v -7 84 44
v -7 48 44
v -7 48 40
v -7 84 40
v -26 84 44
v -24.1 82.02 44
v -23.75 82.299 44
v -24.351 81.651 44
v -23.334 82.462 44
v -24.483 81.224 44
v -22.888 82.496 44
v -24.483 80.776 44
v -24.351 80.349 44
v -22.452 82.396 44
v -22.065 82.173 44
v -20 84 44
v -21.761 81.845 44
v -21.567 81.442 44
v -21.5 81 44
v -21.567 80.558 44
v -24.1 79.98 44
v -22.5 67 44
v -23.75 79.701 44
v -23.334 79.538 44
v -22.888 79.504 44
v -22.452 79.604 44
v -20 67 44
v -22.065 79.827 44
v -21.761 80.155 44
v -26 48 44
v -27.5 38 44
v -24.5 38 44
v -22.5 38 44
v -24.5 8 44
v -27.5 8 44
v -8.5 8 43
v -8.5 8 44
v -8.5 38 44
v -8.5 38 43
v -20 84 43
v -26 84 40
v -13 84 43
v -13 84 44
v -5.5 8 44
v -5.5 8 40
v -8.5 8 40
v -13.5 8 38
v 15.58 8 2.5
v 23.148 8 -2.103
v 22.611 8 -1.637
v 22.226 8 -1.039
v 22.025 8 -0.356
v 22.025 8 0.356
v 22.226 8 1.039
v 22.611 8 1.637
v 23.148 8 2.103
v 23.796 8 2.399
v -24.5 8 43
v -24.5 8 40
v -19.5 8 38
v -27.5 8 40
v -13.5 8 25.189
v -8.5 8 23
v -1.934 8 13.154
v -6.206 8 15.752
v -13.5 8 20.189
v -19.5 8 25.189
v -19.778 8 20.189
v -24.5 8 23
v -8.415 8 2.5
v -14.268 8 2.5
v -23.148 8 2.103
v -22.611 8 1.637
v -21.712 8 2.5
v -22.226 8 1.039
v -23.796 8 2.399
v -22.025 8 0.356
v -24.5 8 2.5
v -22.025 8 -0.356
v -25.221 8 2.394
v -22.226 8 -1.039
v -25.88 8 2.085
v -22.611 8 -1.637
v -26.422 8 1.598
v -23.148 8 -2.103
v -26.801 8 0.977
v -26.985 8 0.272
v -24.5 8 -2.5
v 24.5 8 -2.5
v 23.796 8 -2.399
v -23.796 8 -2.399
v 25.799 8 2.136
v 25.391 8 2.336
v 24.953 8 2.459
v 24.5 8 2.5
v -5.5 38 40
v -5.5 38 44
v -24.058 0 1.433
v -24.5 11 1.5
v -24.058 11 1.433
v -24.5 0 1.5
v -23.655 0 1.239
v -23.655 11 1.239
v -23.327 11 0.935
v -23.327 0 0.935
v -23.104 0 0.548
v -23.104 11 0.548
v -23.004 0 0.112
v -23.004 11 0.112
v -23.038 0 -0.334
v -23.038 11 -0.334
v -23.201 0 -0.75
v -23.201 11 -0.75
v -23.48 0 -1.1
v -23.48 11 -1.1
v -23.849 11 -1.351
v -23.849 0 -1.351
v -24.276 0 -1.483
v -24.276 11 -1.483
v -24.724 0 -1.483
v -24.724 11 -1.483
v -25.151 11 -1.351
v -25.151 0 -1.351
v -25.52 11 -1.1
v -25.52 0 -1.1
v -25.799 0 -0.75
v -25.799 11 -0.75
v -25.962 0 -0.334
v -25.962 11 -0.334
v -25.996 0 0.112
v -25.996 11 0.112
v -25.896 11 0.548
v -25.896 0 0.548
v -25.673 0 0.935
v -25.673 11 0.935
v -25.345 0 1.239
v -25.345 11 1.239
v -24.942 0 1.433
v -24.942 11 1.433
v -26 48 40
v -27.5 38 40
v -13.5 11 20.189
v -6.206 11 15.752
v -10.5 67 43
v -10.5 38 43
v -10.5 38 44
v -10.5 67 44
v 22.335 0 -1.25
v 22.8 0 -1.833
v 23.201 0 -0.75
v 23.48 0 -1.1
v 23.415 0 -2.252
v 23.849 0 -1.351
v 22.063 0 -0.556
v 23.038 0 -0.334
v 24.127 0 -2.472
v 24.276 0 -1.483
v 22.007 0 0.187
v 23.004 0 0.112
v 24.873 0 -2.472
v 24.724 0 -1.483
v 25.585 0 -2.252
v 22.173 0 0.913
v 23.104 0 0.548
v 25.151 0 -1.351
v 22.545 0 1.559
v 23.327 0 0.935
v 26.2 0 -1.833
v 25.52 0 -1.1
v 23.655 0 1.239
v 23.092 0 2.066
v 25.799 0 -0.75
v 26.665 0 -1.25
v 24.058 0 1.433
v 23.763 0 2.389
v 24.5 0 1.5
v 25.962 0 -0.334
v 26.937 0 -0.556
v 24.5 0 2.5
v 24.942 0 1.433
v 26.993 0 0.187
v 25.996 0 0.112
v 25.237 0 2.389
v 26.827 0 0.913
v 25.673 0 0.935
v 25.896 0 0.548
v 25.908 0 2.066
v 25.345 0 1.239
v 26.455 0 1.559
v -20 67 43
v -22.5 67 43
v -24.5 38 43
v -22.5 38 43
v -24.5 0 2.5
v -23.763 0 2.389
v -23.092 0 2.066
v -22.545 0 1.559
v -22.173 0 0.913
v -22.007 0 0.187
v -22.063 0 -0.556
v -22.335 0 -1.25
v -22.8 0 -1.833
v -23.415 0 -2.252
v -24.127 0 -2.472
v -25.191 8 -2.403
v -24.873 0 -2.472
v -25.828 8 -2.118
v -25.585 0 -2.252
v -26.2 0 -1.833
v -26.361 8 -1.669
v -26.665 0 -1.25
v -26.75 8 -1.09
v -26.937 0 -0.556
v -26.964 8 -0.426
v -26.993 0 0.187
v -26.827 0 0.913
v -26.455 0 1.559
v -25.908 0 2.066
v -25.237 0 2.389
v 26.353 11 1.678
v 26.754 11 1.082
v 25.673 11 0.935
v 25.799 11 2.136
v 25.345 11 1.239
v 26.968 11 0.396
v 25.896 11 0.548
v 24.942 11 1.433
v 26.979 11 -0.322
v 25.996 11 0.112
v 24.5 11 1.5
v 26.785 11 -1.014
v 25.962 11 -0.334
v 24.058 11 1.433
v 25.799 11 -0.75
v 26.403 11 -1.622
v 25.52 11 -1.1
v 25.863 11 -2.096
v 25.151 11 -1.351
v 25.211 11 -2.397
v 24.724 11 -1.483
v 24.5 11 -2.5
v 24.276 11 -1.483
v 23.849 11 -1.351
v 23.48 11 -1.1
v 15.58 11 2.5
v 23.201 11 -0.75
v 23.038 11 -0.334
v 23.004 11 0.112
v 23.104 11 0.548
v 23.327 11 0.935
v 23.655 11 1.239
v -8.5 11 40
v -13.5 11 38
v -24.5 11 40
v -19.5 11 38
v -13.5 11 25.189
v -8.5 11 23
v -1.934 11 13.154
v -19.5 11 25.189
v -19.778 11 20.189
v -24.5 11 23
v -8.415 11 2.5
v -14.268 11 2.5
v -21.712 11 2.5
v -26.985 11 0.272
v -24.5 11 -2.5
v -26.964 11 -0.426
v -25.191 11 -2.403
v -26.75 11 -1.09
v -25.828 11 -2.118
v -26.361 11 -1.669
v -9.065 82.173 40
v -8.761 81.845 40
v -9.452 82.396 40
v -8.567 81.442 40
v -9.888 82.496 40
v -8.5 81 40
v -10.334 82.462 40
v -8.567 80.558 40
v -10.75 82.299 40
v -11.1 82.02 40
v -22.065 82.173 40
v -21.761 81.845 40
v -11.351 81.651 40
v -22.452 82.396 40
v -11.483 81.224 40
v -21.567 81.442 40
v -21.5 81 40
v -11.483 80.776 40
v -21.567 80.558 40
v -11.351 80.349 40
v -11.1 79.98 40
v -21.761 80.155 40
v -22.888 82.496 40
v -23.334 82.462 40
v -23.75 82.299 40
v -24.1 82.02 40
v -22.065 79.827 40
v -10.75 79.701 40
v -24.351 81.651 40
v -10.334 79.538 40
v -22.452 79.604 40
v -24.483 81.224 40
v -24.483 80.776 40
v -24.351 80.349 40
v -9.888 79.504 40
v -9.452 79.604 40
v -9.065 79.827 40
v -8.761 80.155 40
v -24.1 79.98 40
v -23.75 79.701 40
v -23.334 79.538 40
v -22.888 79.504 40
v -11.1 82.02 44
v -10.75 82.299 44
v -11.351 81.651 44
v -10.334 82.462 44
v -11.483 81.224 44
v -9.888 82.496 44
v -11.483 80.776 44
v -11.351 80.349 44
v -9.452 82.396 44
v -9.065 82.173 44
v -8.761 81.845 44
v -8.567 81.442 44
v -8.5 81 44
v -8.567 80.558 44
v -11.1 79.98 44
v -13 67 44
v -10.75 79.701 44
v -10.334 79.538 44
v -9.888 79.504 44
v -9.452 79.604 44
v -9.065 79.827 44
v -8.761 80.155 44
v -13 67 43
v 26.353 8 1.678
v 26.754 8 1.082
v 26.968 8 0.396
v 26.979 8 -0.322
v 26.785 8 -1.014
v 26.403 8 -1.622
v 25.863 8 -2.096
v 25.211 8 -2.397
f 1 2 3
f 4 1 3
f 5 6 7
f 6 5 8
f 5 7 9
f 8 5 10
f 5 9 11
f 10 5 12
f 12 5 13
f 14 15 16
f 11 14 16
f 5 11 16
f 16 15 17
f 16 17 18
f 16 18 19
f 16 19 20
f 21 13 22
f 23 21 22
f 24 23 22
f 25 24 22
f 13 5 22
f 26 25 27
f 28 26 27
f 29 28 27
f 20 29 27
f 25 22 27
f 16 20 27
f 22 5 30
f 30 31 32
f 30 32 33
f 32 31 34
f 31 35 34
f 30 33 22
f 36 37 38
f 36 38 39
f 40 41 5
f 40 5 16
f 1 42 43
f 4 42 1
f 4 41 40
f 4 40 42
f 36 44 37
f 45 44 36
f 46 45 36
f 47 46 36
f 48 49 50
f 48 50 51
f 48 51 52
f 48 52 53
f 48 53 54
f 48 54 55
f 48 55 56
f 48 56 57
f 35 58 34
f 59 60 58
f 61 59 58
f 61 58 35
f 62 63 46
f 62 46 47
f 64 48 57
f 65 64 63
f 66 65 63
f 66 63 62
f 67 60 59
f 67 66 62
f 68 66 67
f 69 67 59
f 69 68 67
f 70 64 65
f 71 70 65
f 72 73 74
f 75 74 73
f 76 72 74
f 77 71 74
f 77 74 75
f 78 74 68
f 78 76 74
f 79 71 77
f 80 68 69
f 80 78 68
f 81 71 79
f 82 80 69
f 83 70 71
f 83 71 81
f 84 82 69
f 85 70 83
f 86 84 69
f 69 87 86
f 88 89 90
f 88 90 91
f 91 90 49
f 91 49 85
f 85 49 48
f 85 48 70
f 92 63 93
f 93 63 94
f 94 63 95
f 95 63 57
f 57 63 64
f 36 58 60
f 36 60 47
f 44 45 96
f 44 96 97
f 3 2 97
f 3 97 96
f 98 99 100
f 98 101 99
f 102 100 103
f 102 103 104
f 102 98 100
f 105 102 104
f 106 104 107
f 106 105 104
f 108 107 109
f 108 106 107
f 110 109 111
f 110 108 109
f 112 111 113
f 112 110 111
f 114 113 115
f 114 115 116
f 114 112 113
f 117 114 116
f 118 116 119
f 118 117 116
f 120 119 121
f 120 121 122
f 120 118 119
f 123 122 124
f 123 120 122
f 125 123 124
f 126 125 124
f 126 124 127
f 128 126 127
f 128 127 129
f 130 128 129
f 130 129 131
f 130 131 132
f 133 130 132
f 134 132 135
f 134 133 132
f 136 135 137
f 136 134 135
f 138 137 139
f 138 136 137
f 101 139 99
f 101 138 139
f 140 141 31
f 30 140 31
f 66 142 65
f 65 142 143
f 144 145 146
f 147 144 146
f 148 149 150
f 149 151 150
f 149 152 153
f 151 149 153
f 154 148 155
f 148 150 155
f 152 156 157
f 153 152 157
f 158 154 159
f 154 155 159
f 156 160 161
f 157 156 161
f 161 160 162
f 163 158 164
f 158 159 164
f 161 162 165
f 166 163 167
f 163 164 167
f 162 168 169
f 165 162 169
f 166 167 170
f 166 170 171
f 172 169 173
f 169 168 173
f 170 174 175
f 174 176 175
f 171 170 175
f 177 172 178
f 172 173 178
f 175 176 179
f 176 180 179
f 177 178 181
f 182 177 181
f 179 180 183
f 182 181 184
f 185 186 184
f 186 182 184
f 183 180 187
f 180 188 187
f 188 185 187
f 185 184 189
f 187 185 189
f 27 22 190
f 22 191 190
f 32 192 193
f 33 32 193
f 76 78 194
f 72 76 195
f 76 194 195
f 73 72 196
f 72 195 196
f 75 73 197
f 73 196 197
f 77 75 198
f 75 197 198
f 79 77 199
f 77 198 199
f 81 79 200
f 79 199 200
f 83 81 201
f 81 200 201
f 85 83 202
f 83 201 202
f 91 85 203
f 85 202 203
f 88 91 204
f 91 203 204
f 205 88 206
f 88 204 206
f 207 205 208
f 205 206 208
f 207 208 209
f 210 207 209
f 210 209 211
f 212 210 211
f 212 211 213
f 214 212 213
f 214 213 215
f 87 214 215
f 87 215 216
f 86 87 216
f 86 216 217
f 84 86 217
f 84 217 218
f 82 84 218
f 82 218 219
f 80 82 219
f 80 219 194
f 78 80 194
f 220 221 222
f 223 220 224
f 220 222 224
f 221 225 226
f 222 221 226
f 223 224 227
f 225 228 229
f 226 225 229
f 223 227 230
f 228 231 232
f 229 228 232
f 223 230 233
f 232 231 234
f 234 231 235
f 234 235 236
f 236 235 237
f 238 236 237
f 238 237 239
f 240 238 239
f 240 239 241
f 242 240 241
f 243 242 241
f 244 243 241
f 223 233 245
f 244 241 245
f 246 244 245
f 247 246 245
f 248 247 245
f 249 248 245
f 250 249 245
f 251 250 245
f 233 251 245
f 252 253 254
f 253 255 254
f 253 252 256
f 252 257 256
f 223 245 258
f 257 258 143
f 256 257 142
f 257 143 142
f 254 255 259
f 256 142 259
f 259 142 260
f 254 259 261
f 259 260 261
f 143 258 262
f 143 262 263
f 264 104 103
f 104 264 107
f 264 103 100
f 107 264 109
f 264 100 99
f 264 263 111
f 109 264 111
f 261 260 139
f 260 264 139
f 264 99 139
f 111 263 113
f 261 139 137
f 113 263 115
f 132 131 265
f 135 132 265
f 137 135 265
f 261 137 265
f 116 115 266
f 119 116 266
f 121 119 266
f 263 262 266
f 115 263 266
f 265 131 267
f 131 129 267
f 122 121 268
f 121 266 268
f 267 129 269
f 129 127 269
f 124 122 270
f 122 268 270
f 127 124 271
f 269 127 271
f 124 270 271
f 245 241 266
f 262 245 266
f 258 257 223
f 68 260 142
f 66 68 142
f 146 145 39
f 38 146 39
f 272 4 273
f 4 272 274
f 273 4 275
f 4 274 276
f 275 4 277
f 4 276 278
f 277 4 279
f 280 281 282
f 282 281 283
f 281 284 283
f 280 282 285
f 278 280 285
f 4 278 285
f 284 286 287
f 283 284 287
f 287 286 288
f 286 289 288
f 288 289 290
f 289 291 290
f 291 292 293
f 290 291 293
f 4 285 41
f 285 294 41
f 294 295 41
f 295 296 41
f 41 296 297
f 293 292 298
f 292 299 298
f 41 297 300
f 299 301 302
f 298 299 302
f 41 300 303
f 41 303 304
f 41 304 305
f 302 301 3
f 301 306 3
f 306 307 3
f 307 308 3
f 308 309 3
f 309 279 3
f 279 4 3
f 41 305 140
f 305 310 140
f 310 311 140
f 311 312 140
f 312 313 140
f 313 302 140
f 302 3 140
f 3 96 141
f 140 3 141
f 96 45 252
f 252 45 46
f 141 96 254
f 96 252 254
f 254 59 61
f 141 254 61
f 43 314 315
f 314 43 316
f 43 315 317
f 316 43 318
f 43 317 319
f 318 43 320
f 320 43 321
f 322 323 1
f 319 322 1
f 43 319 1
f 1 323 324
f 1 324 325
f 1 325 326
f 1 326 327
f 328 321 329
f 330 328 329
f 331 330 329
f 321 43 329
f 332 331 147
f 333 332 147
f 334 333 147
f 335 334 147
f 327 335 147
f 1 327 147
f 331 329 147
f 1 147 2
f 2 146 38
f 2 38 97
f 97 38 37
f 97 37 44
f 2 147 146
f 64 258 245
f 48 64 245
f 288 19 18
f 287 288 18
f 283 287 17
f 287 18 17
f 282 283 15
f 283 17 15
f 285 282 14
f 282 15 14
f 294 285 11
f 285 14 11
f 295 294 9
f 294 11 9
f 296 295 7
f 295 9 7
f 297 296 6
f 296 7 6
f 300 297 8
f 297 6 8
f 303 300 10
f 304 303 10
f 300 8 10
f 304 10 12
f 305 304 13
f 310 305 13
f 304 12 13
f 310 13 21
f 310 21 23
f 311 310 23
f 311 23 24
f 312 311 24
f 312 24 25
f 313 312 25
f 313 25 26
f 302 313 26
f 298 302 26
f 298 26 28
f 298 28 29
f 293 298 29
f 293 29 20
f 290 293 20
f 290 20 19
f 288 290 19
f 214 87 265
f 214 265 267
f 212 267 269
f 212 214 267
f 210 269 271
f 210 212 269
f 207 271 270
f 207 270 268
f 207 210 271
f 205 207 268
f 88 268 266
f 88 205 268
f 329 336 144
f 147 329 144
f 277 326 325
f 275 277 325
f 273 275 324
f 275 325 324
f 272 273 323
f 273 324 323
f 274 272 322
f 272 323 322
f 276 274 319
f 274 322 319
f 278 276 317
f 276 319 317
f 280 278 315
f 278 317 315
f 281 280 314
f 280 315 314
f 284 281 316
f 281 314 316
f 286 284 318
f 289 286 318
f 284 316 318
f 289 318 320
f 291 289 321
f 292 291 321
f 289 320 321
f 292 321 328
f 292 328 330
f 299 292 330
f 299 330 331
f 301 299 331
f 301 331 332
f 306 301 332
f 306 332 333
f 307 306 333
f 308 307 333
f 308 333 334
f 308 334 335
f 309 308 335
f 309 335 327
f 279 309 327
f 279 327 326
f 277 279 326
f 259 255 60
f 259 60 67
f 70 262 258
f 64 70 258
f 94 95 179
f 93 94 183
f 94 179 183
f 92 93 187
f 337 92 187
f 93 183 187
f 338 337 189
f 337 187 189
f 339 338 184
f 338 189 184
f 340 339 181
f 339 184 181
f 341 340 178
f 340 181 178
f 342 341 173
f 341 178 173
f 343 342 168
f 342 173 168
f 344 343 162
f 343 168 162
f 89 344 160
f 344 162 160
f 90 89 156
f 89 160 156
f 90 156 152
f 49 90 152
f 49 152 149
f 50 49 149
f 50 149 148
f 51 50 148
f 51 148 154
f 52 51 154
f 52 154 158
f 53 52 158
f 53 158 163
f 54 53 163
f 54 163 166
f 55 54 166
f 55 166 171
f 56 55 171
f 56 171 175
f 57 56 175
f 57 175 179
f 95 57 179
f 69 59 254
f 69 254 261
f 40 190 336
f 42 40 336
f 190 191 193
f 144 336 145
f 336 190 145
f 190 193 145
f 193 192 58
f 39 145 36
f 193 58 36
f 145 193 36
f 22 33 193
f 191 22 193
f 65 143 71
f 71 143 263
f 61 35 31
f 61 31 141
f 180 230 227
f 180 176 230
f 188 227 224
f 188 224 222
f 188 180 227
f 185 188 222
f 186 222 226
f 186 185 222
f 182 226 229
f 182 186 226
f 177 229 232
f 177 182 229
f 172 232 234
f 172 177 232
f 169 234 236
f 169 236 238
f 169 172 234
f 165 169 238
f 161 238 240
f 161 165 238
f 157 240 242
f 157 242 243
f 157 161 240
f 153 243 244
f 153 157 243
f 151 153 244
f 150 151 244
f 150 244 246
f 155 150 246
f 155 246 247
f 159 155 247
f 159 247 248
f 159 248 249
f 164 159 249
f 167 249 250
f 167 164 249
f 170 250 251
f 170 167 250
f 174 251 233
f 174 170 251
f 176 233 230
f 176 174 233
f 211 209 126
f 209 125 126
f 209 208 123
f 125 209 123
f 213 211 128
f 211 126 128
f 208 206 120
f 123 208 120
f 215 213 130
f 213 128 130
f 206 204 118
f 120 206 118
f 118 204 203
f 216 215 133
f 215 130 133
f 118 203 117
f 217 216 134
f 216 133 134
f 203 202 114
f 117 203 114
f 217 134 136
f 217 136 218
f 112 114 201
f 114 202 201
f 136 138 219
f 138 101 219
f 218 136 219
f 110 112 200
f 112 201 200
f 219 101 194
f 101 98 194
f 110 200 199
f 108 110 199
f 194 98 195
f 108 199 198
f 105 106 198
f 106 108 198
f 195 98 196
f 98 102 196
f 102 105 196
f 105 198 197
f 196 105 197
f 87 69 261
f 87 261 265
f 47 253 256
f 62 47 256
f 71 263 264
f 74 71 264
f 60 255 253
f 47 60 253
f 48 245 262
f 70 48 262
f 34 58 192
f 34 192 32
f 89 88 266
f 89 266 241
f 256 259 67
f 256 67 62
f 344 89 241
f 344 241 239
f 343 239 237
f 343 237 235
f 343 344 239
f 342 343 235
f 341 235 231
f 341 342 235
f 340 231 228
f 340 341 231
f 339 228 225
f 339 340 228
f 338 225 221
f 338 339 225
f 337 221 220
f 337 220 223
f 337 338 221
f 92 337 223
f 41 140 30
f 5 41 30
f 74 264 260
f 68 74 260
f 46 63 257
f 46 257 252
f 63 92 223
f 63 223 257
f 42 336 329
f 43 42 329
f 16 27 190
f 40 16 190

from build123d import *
from OCP.BRepFilletAPI import BRepFilletAPI_MakeChamfer

# Parameters (mm, degrees)
ESQUISSE1_R             = 2.5
ESQUISSE1_R_2           = 1.5
BOSS_EXTRU_1_DEPTH      = 8
BOSS_EXTRU_1_2_DEPTH    = 8
ESQUISSE2_R             = 1.5
BOSS_EXTRU_2_DEPTH      = 3
ESQUISSE3_W             = 6
ESQUISSE3_H             = 12.810919071
ENL_V_MAT_EXTRU_1_DEPTH = 3
BOSS_EXTRU_3_START      = -3
BOSS_EXTRU_3_DEPTH      = 30
BOSS_EXTRU_5_DEPTH      = 29
BOSS_EXTRU_6_DEPTH      = 17
ESQUISSE7_R             = 1.5
ENL_V_MAT_EXTRU_2_DEPTH = 100.872418615
CHANFREIN1_SIZE         = 1.5
CHANFREIN1_SIZE_2       = 10


with BuildPart() as part:
    # Esquisse1 → Boss.-Extru.1 (new body)
    with BuildSketch(Plane(origin=(0, 0, 0), x_dir=(1, 0, 0), z_dir=(0, 1, 0))):
        with Locations(Location((-24.5, 0, 0), (0, 0, 270))):
            Circle(ESQUISSE1_R)
        with Locations(Location((-24.5, 0, 0), (0, 0, 270))):
            Circle(ESQUISSE1_R_2, mode=Mode.SUBTRACT)
    extrude(amount=BOSS_EXTRU_1_DEPTH)



with BuildPart() as body_2:
    # Esquisse1 → Boss.-Extru.1 2 (new body)
    with BuildSketch(Plane(origin=(0, 0, 0), x_dir=(1, 0, 0), z_dir=(0, 1, 0))):
        with Locations(Location((24.5, 0, 0), (0, 0, 270))):
            Circle(ESQUISSE1_R)
        with Locations(Location((24.5, 0, 0), (0, 0, 270))):
            Circle(ESQUISSE1_R_2, mode=Mode.SUBTRACT)
    extrude(amount=BOSS_EXTRU_1_2_DEPTH)


with BuildPart() as part_1:
    add(part.part)

    add(body_2.part)  # Boss.-Extru.2 merges body 2
    # Esquisse2 → Boss.-Extru.2 (add)
    with BuildSketch(Plane(origin=(0, 8, 0), x_dir=(1, 0, 0), z_dir=(0, 1, 0))):
        with BuildLine():
            Line((-24.5, 2.5), (24.5, 2.5))
            ThreePointArc((24.5, 2.5), (26.907248053, 0.674653105), (25.799245899, -2.13587455))
            Line((25.799245899, -2.13587455), (-8.5, -23))
            Line((-8.5, -23), (-8.5, -43))
            Line((-8.5, -43), (-24.5, -43))
            Line((-24.5, -43), (-24.5, -23))
            Line((-24.5, -23), (-26.985187688, -0.27173913))
            ThreePointArc((-26.985187688, -0.27173913), (-26.361363455, 1.668929623), (-24.5, 2.5))
        make_face()
        with Locations(Location((-24.5, 0, 0), (0, 0, 270))):
            Circle(ESQUISSE2_R, mode=Mode.SUBTRACT)
        with Locations(Location((24.5, 0, 0), (0, 0, 270))):
            Circle(ESQUISSE2_R, mode=Mode.SUBTRACT)
    extrude(amount=BOSS_EXTRU_2_DEPTH)

    # Esquisse3 → Enlèv. mat.-Extru.1 (cut)
    with BuildSketch(Plane(origin=(0, 11, 0), x_dir=(1, 0, 0), z_dir=(0, 1, 0))):
        Polygon((-6.206238259, -15.752308167), (-14.267576426, -2.5), (-21.711740643, -2.5), (-19.777554548, -20.189080929), (-13.5, -20.189080929), align=None)
        Polygon((-8.415172783, -2.5), (-1.934489158, -13.153816369), (15.579682155, -2.5), align=None)
        with Locations((-16.5, -31.594540464)):
            Rectangle(ESQUISSE3_W, ESQUISSE3_H)
    extrude(amount=-ENL_V_MAT_EXTRU_1_DEPTH, mode=Mode.SUBTRACT)

    # Esquisse4 → Boss.-Extru.3 (add)
    with BuildSketch(Plane(origin=(0, 11, 0), x_dir=(1, 0, 0), z_dir=(0, 1, 0)).offset(BOSS_EXTRU_3_START)):
        Polygon((-24.5, -44), (-27.5, -44), (-27.5, -40), (-24.5, -40), (-8.5, -40), (-5.5, -40), (-5.5, -44), (-8.5, -44), (-8.5, -43), (-24.5, -43), align=None)
    extrude(amount=BOSS_EXTRU_3_DEPTH)

    # Esquisse5 → Boss.-Extru.5 (add)
    with BuildSketch(Plane(origin=(0, 38, 0), x_dir=(1, 0, 0), z_dir=(0, 1, 0))):
        Polygon((-26, -44), (-22.5, -44), (-22.5, -43), (-10.5, -43), (-10.5, -44), (-7, -44), (-7, -40), (-26, -40), align=None)
    extrude(amount=BOSS_EXTRU_5_DEPTH)

    # Esquisse6 → Boss.-Extru.6 (add)
    with BuildSketch(Plane(origin=(0, 67, 0), x_dir=(1, 0, 0), z_dir=(0, 1, 0))):
        Polygon((-20, -44), (-20, -43), (-13, -43), (-13, -44), (-7, -44), (-7, -40), (-26, -40), (-26, -44), align=None)
    extrude(amount=BOSS_EXTRU_6_DEPTH)

    # Esquisse7 → Enlèv. mat.-Extru.2 (cut, through all)
    with BuildSketch(Plane.XY.offset(44)):
        with Locations((-23, 81)):
            Circle(ESQUISSE7_R)
        with Locations((-10, 81)):
            Circle(ESQUISSE7_R)
    extrude(amount=-ENL_V_MAT_EXTRU_2_DEPTH, mode=Mode.SUBTRACT)

    # Chanfrein1
    chanfrein1_edges_1 = [part_1.edges().sort_by_distance(p)[0] for p in [
        (-26, 38, 42),
    ]]
    chanfrein1_side_1 = [part_1.faces().sort_by_distance(p)[0] for p in [
        (-26.03, 38, 42),
    ]]
    chanfrein1_edges_2 = [part_1.edges().sort_by_distance(p)[0] for p in [
        (-7, 38, 42),
    ]]
    chanfrein1_side_2 = [part_1.faces().sort_by_distance(p)[0] for p in [
        (-6.97, 38, 42),
    ]]
    chanfrein1 = BRepFilletAPI_MakeChamfer(part_1.part.solid().wrapped)
    for e in chanfrein1_edges_1:
        chanfrein1.Add(CHANFREIN1_SIZE - 0.0001, CHANFREIN1_SIZE_2 - 0.0001, e.wrapped, chanfrein1_side_1[0].wrapped)
    for e in chanfrein1_edges_2:
        chanfrein1.Add(CHANFREIN1_SIZE - 0.0001, CHANFREIN1_SIZE_2 - 0.0001, e.wrapped, chanfrein1_side_2[0].wrapped)
    add(Compound.cast(chanfrein1.Shape()), mode=Mode.REPLACE)  # a hair under: the kernel refuses the full size


solid = part_1.part
